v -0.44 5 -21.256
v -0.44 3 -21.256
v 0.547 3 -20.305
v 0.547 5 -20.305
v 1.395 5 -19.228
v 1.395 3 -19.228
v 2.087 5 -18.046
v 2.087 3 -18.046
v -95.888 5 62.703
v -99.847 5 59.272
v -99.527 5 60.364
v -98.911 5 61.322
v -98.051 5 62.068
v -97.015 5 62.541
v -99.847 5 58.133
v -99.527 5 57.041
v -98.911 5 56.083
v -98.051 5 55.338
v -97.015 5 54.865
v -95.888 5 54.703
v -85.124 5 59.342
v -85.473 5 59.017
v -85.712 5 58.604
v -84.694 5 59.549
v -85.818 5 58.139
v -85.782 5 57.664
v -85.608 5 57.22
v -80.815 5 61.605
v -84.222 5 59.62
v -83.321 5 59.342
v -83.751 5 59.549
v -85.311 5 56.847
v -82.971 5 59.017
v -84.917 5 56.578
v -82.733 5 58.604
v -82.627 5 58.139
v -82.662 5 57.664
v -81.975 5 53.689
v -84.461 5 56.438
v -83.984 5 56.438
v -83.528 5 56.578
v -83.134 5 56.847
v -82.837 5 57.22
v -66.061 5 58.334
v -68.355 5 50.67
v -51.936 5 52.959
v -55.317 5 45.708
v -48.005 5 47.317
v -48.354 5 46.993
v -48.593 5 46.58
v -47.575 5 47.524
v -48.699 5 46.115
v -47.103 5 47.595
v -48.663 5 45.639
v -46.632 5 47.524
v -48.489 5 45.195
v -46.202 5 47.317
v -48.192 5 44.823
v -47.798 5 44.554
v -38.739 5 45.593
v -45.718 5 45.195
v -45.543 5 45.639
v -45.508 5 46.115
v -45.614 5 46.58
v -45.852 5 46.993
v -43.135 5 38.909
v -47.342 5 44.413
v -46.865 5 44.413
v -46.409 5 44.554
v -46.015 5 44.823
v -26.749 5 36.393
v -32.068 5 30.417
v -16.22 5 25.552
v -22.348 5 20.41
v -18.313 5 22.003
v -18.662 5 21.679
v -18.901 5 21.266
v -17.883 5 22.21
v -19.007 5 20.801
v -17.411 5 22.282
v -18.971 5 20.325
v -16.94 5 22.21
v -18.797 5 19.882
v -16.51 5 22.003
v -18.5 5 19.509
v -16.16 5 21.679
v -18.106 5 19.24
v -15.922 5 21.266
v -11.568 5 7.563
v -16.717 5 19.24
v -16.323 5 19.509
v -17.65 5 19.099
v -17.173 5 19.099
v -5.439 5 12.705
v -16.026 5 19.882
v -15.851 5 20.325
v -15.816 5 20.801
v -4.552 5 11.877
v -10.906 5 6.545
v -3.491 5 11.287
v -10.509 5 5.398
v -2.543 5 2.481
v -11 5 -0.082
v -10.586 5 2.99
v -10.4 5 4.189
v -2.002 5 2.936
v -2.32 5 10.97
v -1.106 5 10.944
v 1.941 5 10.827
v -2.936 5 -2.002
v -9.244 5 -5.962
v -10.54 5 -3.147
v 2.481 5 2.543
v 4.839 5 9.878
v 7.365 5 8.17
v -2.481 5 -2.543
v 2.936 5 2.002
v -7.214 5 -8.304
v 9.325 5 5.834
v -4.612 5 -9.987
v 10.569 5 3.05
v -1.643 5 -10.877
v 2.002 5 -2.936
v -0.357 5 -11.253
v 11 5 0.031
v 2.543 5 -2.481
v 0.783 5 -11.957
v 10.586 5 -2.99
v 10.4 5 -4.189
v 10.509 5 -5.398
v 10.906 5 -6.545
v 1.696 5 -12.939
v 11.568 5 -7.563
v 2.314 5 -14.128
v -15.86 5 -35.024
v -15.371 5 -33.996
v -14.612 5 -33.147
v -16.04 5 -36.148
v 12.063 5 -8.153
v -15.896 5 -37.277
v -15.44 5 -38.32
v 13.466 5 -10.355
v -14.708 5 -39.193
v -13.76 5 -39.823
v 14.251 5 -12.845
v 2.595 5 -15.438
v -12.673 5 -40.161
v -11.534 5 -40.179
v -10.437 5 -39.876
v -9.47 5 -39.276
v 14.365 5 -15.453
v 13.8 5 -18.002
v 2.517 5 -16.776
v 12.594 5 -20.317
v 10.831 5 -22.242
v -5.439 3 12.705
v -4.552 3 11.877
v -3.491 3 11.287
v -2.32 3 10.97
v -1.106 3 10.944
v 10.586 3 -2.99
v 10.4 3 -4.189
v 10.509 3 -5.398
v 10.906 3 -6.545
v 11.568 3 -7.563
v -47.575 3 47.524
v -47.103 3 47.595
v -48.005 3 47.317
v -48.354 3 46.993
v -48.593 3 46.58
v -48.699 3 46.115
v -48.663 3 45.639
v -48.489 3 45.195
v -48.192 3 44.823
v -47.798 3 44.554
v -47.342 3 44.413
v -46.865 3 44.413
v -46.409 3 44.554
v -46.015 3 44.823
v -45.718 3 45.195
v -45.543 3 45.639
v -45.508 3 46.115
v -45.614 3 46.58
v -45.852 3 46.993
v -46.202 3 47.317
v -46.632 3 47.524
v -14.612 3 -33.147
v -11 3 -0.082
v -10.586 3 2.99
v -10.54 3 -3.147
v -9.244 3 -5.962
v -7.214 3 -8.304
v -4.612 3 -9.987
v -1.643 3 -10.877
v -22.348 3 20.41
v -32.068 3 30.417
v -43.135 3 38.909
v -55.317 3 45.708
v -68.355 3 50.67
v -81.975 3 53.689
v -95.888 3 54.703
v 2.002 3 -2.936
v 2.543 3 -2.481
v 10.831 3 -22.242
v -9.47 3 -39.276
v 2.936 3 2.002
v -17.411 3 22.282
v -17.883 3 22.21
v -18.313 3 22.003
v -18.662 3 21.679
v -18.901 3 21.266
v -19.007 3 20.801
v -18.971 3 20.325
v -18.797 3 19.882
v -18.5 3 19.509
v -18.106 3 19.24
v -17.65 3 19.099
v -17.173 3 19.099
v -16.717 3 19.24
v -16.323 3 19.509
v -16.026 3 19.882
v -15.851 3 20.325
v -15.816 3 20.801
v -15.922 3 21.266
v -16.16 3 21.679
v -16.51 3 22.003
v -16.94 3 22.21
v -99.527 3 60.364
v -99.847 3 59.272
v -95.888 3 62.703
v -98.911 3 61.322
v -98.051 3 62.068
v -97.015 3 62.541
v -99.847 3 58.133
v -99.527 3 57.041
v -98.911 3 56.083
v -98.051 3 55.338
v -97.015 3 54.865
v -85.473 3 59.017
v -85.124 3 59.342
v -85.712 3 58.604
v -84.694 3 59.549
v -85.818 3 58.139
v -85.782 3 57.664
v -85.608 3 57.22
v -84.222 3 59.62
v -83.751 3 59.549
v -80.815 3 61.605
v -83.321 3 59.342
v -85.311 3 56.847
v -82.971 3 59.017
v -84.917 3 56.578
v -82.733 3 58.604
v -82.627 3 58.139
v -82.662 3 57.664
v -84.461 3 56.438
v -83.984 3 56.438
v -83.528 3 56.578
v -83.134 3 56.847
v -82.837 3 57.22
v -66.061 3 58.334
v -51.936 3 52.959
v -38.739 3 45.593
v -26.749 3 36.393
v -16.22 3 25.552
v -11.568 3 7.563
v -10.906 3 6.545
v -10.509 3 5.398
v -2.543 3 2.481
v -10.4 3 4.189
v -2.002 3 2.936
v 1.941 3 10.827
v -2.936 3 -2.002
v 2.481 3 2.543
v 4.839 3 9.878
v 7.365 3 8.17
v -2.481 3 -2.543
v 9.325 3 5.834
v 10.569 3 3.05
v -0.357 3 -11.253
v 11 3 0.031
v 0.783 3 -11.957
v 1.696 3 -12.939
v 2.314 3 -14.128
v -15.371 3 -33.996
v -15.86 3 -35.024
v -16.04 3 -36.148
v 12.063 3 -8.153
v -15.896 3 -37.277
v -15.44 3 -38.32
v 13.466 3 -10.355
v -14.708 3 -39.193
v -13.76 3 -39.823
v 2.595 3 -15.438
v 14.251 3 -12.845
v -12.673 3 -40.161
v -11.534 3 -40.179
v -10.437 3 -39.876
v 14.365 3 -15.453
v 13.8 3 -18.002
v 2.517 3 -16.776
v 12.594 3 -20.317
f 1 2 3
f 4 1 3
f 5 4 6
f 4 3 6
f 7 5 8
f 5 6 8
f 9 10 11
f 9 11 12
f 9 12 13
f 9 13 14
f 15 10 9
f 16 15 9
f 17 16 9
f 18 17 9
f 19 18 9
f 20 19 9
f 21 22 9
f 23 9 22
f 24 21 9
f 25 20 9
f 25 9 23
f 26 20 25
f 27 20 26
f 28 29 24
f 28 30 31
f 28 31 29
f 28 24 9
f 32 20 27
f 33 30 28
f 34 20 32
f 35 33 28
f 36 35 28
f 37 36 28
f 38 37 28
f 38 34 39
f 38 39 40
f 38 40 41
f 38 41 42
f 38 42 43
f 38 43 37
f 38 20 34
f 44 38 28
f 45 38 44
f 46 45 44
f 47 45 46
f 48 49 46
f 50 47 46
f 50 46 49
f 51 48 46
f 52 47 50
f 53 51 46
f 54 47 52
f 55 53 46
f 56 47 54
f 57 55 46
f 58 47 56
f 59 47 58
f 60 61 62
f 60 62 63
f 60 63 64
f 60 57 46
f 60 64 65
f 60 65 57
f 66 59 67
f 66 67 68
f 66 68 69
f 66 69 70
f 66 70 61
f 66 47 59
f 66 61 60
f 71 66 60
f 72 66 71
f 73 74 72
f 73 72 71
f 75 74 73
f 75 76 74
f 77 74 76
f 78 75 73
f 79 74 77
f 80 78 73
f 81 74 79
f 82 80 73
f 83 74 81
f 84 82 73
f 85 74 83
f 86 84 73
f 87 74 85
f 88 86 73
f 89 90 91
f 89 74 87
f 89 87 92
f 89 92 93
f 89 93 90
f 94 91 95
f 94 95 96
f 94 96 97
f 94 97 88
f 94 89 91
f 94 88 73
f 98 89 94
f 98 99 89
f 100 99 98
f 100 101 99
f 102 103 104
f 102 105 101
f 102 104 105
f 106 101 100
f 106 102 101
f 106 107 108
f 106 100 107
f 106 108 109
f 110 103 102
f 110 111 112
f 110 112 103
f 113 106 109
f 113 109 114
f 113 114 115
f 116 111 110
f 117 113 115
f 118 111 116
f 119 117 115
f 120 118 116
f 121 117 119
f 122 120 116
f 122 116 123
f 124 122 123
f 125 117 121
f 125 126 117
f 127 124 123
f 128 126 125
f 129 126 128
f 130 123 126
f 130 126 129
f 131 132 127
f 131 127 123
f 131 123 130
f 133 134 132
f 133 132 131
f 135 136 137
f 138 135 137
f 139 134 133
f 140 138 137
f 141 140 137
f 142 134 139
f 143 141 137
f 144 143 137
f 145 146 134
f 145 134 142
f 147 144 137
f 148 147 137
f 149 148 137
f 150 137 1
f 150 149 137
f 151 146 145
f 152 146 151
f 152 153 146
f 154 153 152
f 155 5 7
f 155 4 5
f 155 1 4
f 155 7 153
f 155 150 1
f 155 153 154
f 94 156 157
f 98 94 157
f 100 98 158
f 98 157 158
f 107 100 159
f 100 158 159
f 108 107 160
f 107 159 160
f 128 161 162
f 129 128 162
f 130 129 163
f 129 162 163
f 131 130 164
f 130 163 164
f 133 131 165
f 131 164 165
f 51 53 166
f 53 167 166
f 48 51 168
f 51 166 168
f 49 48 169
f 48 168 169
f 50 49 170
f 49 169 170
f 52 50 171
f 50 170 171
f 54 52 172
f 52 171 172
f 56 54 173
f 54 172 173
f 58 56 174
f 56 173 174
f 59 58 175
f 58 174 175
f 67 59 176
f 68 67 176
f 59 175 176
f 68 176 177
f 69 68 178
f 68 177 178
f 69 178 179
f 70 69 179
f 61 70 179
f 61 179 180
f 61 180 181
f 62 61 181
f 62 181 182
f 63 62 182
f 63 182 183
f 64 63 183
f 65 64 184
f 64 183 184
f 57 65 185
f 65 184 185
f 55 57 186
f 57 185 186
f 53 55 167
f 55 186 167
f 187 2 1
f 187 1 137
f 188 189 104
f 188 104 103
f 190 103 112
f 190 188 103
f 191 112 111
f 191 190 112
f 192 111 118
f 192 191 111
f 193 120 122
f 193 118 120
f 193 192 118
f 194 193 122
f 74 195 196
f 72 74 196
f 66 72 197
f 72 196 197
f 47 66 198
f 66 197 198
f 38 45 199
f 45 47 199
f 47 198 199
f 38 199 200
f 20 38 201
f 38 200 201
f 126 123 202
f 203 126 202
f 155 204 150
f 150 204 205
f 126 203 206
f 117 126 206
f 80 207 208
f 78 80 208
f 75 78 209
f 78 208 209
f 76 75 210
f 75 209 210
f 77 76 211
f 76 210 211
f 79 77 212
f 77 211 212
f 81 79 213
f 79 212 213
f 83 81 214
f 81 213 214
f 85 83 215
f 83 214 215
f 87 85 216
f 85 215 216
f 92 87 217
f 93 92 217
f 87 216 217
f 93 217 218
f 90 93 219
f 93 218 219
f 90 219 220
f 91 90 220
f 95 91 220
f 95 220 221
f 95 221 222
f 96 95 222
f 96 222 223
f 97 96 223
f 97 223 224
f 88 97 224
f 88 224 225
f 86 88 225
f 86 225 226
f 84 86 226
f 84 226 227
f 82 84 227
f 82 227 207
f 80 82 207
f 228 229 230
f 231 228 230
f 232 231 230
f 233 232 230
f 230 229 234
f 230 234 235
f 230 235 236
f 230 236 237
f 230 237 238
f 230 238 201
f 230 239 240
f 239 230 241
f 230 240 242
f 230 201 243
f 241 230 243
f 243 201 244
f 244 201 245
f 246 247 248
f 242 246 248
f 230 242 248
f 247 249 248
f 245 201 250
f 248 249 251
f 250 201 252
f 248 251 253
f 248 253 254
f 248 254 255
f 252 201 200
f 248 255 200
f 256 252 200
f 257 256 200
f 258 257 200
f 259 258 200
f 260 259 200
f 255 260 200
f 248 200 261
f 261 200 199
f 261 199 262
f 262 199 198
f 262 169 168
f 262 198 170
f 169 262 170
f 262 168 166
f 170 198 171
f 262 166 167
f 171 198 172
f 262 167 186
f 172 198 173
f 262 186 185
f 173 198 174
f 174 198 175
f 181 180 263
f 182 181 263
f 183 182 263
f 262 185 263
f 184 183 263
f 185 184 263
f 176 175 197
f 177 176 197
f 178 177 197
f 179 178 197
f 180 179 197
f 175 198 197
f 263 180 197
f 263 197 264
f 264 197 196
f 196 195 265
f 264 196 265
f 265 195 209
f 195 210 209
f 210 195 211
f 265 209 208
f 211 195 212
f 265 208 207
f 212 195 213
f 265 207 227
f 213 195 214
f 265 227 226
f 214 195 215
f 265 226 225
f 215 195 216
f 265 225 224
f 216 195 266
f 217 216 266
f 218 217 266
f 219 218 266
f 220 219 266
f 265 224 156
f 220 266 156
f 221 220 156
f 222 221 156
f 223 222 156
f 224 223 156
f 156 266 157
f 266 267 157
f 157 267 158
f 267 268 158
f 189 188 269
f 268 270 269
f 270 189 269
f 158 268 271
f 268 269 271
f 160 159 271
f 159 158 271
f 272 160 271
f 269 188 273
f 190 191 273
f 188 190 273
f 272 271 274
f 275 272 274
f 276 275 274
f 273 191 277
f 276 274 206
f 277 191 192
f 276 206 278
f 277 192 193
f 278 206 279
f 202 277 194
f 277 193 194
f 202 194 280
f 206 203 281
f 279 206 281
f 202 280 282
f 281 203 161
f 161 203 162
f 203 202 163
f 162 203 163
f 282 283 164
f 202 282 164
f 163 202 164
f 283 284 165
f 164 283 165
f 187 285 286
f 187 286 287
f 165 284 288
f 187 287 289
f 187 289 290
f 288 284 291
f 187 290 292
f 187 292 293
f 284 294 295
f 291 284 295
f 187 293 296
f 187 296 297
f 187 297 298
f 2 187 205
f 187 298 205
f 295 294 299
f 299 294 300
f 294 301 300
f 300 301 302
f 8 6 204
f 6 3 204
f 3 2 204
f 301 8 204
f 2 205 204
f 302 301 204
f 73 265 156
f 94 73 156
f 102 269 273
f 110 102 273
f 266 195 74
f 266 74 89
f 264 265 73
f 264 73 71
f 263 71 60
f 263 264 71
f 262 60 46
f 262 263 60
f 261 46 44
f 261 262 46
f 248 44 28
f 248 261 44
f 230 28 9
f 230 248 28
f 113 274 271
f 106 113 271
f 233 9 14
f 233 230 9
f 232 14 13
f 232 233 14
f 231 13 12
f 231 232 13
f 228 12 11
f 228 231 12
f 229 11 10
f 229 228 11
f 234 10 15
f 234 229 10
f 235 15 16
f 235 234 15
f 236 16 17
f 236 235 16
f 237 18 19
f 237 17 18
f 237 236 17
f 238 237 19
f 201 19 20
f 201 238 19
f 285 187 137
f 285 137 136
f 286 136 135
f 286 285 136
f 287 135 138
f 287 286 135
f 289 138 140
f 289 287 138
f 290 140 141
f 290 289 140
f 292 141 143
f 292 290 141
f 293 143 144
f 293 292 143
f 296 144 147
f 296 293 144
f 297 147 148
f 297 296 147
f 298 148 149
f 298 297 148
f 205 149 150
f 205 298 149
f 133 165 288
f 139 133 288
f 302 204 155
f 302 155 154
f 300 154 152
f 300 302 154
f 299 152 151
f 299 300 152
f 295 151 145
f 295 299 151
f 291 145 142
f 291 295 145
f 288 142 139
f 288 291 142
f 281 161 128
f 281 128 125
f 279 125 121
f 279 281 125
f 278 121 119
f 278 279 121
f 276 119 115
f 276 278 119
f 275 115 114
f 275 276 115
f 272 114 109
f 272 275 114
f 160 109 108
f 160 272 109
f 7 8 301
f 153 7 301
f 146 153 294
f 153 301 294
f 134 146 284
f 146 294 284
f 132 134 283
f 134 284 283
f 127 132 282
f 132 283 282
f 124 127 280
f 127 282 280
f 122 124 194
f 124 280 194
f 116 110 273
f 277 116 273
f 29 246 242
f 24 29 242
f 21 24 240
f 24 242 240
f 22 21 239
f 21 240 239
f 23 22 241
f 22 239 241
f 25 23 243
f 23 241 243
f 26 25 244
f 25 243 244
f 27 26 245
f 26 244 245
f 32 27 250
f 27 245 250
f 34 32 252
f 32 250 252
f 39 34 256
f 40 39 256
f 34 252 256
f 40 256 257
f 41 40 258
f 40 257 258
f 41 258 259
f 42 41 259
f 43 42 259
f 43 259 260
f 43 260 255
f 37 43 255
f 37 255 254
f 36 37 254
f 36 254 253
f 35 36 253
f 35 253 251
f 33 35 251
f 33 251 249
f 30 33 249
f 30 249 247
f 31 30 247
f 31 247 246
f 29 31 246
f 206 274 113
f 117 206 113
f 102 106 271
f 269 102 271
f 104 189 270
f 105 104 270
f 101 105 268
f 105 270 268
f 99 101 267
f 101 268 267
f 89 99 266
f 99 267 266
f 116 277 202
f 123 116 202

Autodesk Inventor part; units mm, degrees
ref_plane "YZ Plane" through (0, 0, 0) normal (1, 0, 0) x (0, 1, 0)
ref_plane "XZ Plane" through (0, 0, 0) normal (0, 1, 0) x (-1, 0, 0)
ref_plane "XY Plane" through (0, 0, 0) normal (0, 0, 1) x (1, 0, 0)
ref_plane "Work Plane5" through (0, 3, 0) normal (0, 1, 0) x (1, 0, 0)
sketch "Sketch2" plane through (0, 3, 0) normal (0, 1, 0) x (1, 0, 0)
  line L0 (0, 0) -> (-19.2836, -22.9813) construction
  line L1 (5.1953, 21.7488) -> (-12.0407, 36.2115) construction
  arc A0 (-95.8881, -58.7026) -> (-19.2836, -22.9813) centre (-95.8881, 41.2974) ccw construction
  line L2 (-19.2836, -22.9813) -> (-95.8881, 41.2974) construction
  line L3 (-95.8881, 41.2974) -> (-95.8881, -58.7026) construction
  line L4 (0, 0) -> (0, -11) construction
  line L5 (6.4279, 7.6604) -> (0, 0) construction
  arc A1 (6.4279, 7.6604) -> (5.1953, 21.7488) centre (-1.2326, 14.0883) ccw construction
  arc A2 (-95.8881, -54.7026) -> (-95.8881, -62.7026) centre (-95.8881, -58.7026) ccw
  arc A3 (-95.8881, -62.7026) -> (-16.2195, -25.5525) centre (-95.8881, 41.2974) ccw
  arc A4 (-95.8881, -54.7026) -> (-22.3478, -20.4102) centre (-95.8881, 41.2974) ccw
  line L6 (-19.2836, -22.9813) -> (-22.3478, -20.4102) construction
  line L7 (-19.2836, -22.9813) -> (-16.2195, -25.5525) construction
  line L8 (10.8306, 22.2418) -> (-9.4695, 39.2757)
  arc A5 (-9.4695, 39.2757) -> (-14.6118, 33.1473) centre (-12.0407, 36.2115) ccw
  line L9 (-0.44, 21.2557) -> (-14.6118, 33.1473)
  arc A6 (2.0873, 18.0456) -> (-0.44, 21.2557) centre (-6.8679, 13.5953) ccw
  arc A7 (12.0632, 8.1535) -> (10.8306, 22.2418) centre (4.4028, 14.5813) ccw
  circle A8 centre (0, 0) radius 7 construction
  arc A9 (-1.1061, -10.9442) -> (10.5859, 2.9897) centre (0, 0) ccw
  arc A10 (-1.6433, 10.8766) -> (-10.5859, -2.9897) centre (0, 0) ccw
  line L10 (-16.2195, -25.5525) -> (-5.4391, -12.705)
  line L11 (11.5675, 7.5627) -> (12.0632, 8.1535)
  line L12 (-22.3478, -20.4102) -> (-11.5675, -7.5627)
  arc A11 (-1.1061, -10.9442) -> (-5.4391, -12.705) centre (-1.6089, -15.9189) ccw
  arc A12 (11.5675, 7.5627) -> (10.5859, 2.9897) centre (15.3977, 4.3487) ccw
  arc A13 (-11.5675, -7.5627) -> (-10.5859, -2.9897) centre (-15.3977, -4.3487) ccw
  arc A14 (-1.6433, 10.8766) -> (2.0873, 18.0456) centre (-2.3903, 15.8204) ccw
  circle A15 centre (-6.9734, -0.6101) radius 1.5 construction
  line L13 (0, 0) -> (-6.9734, -0.6101) construction
  circle A16 centre (0.6101, -6.9734) radius 1.5 construction
  circle A17 centre (6.9734, 0.6101) radius 1.5 construction
  circle A18 centre (-0.6101, 6.9734) radius 1.5 construction
  line L14 (2.9792, -2.4999) -> (-2.4999, -2.9792)
  line L15 (-2.4999, -2.9792) -> (-2.9792, 2.4999)
  line L16 (-2.9792, 2.4999) -> (2.4999, 2.9792)
  line L17 (2.4999, 2.9792) -> (2.9792, -2.4999)
  line L18 (2.9792, -2.4999) -> (-2.9792, 2.4999) construction
  line L19 (-2.4999, -2.9792) -> (2.4999, 2.9792) construction
  line L20 (-2.7395, -0.2397) -> (0, 0) construction
  point P0 (12.8558, 15.3209)
  point P1 (-3.5224, -10.4208)
  point P2 (9.6508, 5.2785)
  dimension "d53" = 14
  dimension "d24" = 30
  dimension "d27" = 32.5
  dimension "d28" = 20
  dimension "d29" = 100
  dimension "d30" = 50
  dimension "d41" = 10
  dimension "d42" = 140
  dimension "d50" = 8
  dimension "d51" = 4
  dimension "d52" = 10
  dimension "d55" = 11
  dimension "d56" = 11
  dimension "d57" = 5
  dimension "d62" = 3
  dimension "d63" = 45
  dimension "d66" = 360
  dimension "d69" = 5.5
extrude "Extrusion2" add sketch "Sketch2" along normal blind 2
chamfer "Faza1" distance 0.5 angle 45 4 edges at (2.4999, 4, -2.9792) (-2.9792, 4, -2.4999) (-2.4999, 4, 2.9792) (2.9792, 4, 2.4999)
sketch "Sketch3" plane through (0, 5, 0) normal (0, 1, 0) x (1, 0, 0)
  arc A0 (-95.8881, -54.7026) -> (-22.3478, -20.4102) centre (-95.8881, 41.2974) ccw construction
  arc A1 (-84.2223, -58.0198) -> (-17.4113, -20.6815) centre (-95.8881, 41.2974) ccw construction
  arc A2 (-95.8881, -62.7026) -> (-16.2195, -25.5525) centre (-95.8881, 41.2974) ccw construction
  line L0 (-84.2223, -58.0198) -> (-95.8881, 41.2974) construction
  line L1 (-95.8881, 41.2974) -> (-17.4113, -20.6815) construction
  line L2 (-95.8881, 41.2974) -> (0, 0) construction
  point P0 (-47.1033, -45.9954)
  dimension "d73" = 4
  dimension "d74" = 45
  dimension "d75" = 15
hole "Hole1" at (-84.2223, 5, 58.0198) at (-17.4113, 5, 20.6815) at (-47.1033, 5, 45.9954) direction (0, -1, 0) diameter 3.2 end through all
sketch "Sketch4" plane through (0, 5, 0) normal (0, 1, 0) x (1, 0, 0)
  circle A0 centre (-17.4113, -20.6815) radius 1.6 projected
  circle A1 centre (-84.2223, -58.0198) radius 1.6 projected
  circle A2 centre (-47.1033, -45.9954) radius 1.6 projected
  line L0 (-2.5434, -2.4811) -> (-2.9356, 2.0018) projected
  line L1 (-2.4811, 2.5434) -> (-2.9356, 2.0018) projected
  line L2 (-2.4811, 2.5434) -> (2.0018, 2.9356) projected
  line L3 (2.5434, 2.4811) -> (2.0018, 2.9356) projected
  line L4 (2.5434, 2.4811) -> (2.9356, -2.0018) projected
  line L5 (2.4811, -2.5434) -> (2.9356, -2.0018) projected
  line L6 (2.4811, -2.5434) -> (-2.0018, -2.9356) projected
  line L7 (-2.5434, -2.4811) -> (-2.0018, -2.9356) projected
  arc A3 (-95.8881, -62.7026) -> (-16.2195, -25.5525) centre (-95.8881, 41.2974) ccw projected
  line L8 (-16.2195, -25.5525) -> (-5.4391, -12.705) projected
  arc A4 (-1.1061, -10.9442) -> (-5.4391, -12.705) centre (-1.6089, -15.9189) ccw projected
  arc A5 (-1.1061, -10.9442) -> (10.5859, 2.9897) centre (0, 0) ccw projected
  arc A6 (11.5675, 7.5627) -> (10.5859, 2.9897) centre (15.3977, 4.3487) ccw projected
  line L9 (11.5675, 7.5627) -> (12.0632, 8.1535) projected
  arc A7 (12.0632, 8.1535) -> (10.8306, 22.2418) centre (4.4028, 14.5813) ccw projected
  line L10 (10.8306, 22.2418) -> (-9.4695, 39.2757) projected
  arc A8 (-9.4695, 39.2757) -> (-14.6118, 33.1473) centre (-12.0407, 36.2115) ccw projected
  line L11 (-14.6118, 33.1473) -> (-0.44, 21.2557) projected
  arc A9 (2.0873, 18.0456) -> (-0.44, 21.2557) centre (-6.8679, 13.5953) ccw projected
  arc A10 (-1.6433, 10.8766) -> (2.0873, 18.0456) centre (-2.3903, 15.8204) ccw projected
  arc A11 (-1.6433, 10.8766) -> (-10.5859, -2.9897) centre (0, 0) ccw projected
  arc A12 (-11.5675, -7.5627) -> (-10.5859, -2.9897) centre (-15.3977, -4.3487) ccw projected
  line L12 (-11.5675, -7.5627) -> (-22.3478, -20.4102) projected
  arc A13 (-95.8881, -54.7026) -> (-22.3478, -20.4102) centre (-95.8881, 41.2974) ccw projected
  arc A14 (-95.8881, -54.7026) -> (-95.8881, -62.7026) centre (-95.8881, -58.7026) ccw projected
  point P0 (0, 0)
properties part number "wstepna_geometria_wersja_2"
